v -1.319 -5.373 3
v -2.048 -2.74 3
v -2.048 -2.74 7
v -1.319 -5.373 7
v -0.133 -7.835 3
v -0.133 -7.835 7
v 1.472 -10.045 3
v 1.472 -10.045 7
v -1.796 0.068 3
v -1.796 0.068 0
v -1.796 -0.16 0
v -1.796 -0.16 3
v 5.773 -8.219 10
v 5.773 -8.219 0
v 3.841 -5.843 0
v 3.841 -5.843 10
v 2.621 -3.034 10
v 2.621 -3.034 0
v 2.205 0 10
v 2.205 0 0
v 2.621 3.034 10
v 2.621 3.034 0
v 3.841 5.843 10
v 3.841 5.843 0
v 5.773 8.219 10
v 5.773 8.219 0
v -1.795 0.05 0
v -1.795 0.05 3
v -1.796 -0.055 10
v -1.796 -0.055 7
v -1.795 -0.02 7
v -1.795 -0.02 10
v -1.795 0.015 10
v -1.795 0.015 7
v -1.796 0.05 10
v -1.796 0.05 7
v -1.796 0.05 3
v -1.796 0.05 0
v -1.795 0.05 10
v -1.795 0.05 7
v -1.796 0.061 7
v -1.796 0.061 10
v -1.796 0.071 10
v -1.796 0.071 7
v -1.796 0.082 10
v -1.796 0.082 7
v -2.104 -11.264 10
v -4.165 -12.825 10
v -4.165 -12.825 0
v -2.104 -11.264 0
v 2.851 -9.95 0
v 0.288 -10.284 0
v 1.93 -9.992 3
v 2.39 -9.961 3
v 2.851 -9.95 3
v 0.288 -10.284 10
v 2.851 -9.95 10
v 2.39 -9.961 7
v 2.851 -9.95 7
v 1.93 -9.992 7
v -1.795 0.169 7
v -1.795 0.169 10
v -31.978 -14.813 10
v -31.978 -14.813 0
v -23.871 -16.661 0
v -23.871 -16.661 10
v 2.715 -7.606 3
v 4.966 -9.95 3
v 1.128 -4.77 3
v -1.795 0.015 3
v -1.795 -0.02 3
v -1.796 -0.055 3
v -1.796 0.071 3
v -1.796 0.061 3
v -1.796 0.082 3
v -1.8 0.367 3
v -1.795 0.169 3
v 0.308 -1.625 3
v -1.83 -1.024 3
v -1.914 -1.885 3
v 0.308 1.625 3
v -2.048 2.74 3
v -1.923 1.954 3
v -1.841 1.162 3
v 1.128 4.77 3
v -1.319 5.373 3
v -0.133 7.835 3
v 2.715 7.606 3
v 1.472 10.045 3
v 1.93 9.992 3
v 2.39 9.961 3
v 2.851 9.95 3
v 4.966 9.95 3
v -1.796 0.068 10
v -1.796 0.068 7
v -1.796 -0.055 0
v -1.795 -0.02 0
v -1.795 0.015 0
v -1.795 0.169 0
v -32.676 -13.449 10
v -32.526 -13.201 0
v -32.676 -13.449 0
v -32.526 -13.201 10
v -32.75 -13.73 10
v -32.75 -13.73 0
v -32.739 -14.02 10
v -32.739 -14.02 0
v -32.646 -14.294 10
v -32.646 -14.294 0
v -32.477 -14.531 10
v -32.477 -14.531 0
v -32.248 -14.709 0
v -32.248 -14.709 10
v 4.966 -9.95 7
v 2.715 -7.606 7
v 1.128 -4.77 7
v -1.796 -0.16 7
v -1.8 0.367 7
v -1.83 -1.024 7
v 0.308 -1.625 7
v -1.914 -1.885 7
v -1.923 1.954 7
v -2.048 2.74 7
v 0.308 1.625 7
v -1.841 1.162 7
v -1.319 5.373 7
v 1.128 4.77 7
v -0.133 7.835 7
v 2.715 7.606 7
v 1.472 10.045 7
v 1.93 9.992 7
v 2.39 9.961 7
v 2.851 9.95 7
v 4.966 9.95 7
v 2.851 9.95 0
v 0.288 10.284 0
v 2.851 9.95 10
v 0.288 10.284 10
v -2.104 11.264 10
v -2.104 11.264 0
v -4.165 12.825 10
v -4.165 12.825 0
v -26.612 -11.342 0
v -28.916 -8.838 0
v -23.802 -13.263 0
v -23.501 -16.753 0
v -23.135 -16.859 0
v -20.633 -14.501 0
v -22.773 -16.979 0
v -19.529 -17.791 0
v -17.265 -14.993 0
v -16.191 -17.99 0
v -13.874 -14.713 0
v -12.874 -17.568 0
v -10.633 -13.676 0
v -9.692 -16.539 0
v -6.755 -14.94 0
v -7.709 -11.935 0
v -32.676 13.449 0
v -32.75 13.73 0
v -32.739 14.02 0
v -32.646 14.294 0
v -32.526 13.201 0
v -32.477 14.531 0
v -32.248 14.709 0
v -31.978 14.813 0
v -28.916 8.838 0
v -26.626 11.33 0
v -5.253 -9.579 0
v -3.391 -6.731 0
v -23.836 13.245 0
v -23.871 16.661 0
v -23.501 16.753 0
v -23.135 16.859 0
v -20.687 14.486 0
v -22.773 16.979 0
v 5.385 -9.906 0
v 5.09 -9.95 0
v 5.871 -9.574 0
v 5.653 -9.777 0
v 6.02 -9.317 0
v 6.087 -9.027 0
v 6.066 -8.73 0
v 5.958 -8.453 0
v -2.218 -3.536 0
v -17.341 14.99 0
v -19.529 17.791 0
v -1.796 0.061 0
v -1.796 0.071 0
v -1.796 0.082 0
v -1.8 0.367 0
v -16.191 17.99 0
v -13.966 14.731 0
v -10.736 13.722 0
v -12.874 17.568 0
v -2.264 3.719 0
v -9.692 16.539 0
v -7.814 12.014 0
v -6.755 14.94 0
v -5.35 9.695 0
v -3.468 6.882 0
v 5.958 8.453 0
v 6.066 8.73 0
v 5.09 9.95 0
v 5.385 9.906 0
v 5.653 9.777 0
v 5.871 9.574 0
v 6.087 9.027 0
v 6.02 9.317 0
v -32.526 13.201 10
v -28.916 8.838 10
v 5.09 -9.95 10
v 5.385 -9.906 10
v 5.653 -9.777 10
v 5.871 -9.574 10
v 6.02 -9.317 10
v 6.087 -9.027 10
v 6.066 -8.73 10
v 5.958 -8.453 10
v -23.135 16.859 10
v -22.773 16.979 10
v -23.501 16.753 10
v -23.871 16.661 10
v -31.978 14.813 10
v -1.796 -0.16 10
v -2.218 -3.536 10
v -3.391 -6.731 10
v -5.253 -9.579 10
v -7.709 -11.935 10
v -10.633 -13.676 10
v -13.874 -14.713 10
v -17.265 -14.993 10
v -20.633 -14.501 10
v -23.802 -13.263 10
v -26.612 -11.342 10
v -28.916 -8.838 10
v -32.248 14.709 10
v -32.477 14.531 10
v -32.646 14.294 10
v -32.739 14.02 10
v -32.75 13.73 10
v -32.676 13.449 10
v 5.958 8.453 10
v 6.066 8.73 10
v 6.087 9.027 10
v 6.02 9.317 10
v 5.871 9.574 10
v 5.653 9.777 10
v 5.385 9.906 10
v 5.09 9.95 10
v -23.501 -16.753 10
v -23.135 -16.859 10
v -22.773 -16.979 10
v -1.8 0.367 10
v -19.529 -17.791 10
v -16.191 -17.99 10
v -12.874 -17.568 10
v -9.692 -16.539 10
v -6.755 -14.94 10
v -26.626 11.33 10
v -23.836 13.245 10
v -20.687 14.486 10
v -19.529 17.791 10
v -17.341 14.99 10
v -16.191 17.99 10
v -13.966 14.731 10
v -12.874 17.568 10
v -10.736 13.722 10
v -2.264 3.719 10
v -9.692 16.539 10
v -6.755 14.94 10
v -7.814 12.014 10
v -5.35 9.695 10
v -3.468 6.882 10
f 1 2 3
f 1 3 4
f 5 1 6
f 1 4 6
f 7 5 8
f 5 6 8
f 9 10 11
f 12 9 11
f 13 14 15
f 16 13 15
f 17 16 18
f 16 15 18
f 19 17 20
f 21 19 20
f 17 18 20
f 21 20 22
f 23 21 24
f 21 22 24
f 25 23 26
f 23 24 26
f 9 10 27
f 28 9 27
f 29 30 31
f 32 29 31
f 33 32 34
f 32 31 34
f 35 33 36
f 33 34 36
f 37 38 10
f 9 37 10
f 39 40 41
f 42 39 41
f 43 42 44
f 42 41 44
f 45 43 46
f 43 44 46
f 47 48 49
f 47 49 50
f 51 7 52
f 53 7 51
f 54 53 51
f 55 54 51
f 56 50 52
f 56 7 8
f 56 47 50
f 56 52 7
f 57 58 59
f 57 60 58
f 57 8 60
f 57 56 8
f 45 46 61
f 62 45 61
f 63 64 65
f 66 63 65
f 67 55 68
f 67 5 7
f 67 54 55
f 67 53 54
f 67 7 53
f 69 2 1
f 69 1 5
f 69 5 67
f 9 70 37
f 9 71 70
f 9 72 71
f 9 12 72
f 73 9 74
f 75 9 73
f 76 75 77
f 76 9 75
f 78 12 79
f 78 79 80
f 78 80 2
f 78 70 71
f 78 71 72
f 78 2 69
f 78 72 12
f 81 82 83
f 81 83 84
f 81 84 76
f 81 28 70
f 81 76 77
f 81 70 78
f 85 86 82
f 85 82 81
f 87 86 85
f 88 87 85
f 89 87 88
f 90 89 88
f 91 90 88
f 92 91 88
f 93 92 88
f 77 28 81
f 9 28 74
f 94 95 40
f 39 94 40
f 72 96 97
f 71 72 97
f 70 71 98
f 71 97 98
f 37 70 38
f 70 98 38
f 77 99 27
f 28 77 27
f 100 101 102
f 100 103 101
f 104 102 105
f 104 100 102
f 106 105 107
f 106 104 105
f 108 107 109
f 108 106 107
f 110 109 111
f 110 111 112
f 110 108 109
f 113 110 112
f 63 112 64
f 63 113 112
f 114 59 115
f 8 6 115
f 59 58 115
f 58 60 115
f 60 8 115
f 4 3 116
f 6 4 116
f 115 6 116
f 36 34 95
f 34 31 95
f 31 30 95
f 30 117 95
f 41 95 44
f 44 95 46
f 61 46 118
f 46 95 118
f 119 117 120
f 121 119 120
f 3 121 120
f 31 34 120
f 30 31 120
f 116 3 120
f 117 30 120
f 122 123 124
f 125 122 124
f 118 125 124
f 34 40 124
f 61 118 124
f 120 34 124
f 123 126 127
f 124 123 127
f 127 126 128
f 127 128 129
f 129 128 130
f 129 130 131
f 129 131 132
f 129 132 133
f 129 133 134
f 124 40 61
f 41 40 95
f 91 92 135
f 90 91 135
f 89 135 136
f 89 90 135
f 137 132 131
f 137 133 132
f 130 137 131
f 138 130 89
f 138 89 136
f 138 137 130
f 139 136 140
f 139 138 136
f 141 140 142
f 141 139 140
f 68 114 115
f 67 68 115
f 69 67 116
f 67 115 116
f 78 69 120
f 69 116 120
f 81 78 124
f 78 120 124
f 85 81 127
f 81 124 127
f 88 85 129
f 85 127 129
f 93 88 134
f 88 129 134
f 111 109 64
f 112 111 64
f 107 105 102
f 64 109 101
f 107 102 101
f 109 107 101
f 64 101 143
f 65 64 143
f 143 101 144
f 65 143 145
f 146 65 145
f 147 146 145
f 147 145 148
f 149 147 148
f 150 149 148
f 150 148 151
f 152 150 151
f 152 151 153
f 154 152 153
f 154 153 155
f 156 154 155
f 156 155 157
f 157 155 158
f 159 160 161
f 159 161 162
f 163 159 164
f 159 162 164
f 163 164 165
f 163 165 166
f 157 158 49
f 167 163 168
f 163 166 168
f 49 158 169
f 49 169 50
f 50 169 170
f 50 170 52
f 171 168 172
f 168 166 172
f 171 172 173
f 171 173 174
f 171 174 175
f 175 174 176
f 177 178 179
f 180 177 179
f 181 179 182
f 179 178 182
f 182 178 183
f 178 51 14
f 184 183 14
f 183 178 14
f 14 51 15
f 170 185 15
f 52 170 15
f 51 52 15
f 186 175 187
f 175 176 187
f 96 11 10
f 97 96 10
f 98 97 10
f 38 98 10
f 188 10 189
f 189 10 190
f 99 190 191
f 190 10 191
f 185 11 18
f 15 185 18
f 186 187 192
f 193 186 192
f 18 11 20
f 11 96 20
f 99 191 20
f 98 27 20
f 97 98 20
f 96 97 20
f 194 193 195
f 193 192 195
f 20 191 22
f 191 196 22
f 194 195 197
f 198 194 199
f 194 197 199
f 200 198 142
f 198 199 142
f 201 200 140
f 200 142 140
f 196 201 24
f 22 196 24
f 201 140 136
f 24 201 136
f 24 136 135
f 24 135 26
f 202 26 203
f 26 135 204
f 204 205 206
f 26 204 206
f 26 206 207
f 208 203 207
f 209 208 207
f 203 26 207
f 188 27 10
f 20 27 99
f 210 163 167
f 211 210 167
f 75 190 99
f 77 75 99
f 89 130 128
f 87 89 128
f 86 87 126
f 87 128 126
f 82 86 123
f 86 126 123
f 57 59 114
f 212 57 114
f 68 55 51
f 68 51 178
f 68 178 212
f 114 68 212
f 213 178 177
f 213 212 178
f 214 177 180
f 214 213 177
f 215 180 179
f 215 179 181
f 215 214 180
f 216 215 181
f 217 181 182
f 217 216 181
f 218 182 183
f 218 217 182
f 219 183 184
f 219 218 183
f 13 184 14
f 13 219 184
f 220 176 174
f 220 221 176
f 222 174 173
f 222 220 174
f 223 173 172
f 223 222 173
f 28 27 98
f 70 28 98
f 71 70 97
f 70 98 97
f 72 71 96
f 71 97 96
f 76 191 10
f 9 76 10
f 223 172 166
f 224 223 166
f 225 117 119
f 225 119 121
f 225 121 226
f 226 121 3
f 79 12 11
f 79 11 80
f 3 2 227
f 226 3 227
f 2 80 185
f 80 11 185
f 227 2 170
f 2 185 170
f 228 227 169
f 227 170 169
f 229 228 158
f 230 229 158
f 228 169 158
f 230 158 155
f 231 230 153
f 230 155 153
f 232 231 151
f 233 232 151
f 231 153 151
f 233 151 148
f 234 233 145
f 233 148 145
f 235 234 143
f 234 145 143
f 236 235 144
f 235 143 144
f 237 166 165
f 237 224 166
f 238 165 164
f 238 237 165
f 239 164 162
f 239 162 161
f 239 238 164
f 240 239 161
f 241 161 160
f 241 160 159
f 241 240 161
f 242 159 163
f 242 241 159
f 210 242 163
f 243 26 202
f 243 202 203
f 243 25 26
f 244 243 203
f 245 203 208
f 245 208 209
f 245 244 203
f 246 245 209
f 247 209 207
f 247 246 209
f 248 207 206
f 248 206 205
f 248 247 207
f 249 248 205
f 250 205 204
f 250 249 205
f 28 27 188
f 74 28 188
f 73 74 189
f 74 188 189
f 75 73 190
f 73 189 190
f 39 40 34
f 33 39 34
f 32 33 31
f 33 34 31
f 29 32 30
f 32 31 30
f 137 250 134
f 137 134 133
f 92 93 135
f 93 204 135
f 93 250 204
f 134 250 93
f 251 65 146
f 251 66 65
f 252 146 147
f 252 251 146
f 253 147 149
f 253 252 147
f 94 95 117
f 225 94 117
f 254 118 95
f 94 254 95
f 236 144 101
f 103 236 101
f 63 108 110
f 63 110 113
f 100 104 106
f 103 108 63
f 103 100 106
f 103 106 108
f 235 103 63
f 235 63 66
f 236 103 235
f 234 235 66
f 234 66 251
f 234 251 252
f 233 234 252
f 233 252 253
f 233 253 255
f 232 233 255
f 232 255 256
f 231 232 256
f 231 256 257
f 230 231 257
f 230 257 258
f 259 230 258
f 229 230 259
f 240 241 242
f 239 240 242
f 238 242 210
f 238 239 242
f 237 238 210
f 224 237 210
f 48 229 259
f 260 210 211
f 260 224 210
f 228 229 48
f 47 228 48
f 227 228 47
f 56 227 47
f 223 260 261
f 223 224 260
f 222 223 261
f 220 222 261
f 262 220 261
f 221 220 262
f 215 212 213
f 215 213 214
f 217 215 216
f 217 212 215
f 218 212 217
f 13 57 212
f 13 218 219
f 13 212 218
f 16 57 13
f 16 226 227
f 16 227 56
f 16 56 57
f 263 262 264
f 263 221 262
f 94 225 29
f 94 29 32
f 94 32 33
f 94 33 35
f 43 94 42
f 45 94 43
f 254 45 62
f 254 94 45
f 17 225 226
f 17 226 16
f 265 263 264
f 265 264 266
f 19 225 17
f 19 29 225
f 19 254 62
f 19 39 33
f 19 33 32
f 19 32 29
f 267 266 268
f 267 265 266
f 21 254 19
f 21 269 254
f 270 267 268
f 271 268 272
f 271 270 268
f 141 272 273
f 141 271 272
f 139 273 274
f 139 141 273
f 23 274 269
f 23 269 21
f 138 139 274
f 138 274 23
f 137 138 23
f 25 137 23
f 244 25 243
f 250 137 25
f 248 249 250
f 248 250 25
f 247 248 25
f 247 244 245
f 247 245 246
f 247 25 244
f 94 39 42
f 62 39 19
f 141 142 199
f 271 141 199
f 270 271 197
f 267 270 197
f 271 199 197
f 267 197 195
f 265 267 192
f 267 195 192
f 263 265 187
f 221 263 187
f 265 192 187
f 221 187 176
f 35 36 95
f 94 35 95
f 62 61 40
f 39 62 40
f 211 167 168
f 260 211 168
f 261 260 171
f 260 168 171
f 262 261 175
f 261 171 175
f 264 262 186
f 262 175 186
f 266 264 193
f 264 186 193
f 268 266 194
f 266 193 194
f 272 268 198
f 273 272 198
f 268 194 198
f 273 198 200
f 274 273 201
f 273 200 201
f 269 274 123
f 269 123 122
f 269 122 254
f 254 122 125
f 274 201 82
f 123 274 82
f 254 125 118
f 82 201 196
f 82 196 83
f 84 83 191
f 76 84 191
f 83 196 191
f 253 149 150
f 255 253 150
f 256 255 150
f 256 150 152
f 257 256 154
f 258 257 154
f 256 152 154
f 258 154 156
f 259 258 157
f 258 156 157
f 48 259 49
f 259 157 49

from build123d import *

# Parameters (mm, degrees)
F1_DEPTH = 10
F2_R     = 1
F3_R     = 10
F6_DEPTH = 4
F7_R     = 1


# Not quite as in the source:
# - ends of sketch curves that miss each other by under 0.0002 mm in the source are joined
# - a feature names something its author has since deleted; it is built from what else it names


with BuildPart() as f1:
    # F0 (on Top) → F1 (new body)
    with BuildSketch(Plane.XY):
        with BuildLine():
            ThreePointArc((-1.7962988307, -0.1596333839), (-12.2238763072, -14.2863823148), (-28.9155127569, -8.8376503509))
            Line((-28.9155127569, -8.8376503509), (-33.5614731624, -14.4524267481))
            Line((-33.5614731624, -14.4524267481), (-23.2513401401, -16.8024246609))
            ThreePointArc((-23.2513401401, -16.8024246609), (-11.3191539124, -17.1467252838), (-1.7954493794, -9.9498743711))
            Line((-1.7954493794, -9.9498743711), (8.2045506206, -9.9498743711))
            ThreePointArc((8.2045506206, -9.9498743711), (2.2045506206, 0), (8.2045506206, 9.9498743711))
            Line((8.2045506206, 9.9498743711), (-1.7954493794, 9.9498743711))
            ThreePointArc((-1.7954493794, 9.9498743711), (-11.3191539124, 17.1467252838), (-23.2513401401, 16.8024246609))
            Line((-23.2513401401, 16.8024246609), (-33.5614731624, 14.4524267481))
            Line((-33.5614731624, 14.4524267481), (-28.9155127569, 8.8376503509))
            ThreePointArc((-28.9155127569, 8.8376503509), (-12.3227425268, 14.3176427323), (-1.79993923, 0.3669814152))
            ThreePointArc((-1.79993923, 0.3669814152), (-1.7971307794, 0.2245866702), (-1.7956744539, 0.0821716783))
            Line((-1.7956744539, 0.0821716783), (-1.7954493794, 0.1693372455))
            Line((-1.7954493794, 0.1693372455), (-1.7954493794, 0.0497335093))
            ThreePointArc((-1.7954493794, 0.0497335093), (-1.795550035, -0.0549514122), (-1.7962988307, -0.1596333839))
        make_face()
        with BuildLine():
            Line((-1.7957105611, 0.0681883168), (-1.7962988307, -0.1596333839))
            ThreePointArc((-1.7962988307, -0.1596333839), (-1.795550035, -0.0549514122), (-1.7955318261, 0.049733236))
            Line((-1.7955318261, 0.049733236), (-1.7957105611, 0.0681883168))
        make_face()
        with BuildLine():
            Line((-1.7957105611, 0.0681883168), (-1.7954493794, 0.0497335093))
            ThreePointArc((-1.7954493794, 0.0497335093), (-1.7955943712, 0.0659524957), (-1.7956744539, 0.0821716783))
            Line((-1.7956744539, 0.0821716783), (-1.7957105611, 0.0681883168))
        make_face()
        with BuildLine():
            Line((-1.79993923, 0.3669814152), (-1.7957105611, 0.0681883168))
            Line((-1.7957105611, 0.0681883168), (-1.7956744539, 0.0821716783))
            ThreePointArc((-1.7956744539, 0.0821716783), (-1.7971307794, 0.2245866702), (-1.79993923, 0.3669814152))
        make_face()
    extrude(amount=F1_DEPTH)

    # F2
    f2_edges = [f1.edges().sort_by_distance(p)[0] for p in [
        (-33.561473, -14.452427, 5),
        (-33.561473, 14.452427, 5),
    ]]
    fillet(f2_edges, radius=F2_R)

    # F3
    f3_edges = [f1.edges().sort_by_distance(p)[0] for p in [
        (-1.795449, 9.949874, 5),
        (-1.795449, -9.949874, 5),
        (-23.25134, 16.802425, 5),
        (-23.25134, -16.802425, 5),
    ]]
    fillet(f3_edges, radius=F3_R)

    # F5 (on offset) → F6 (cut)
    with BuildSketch(Plane.XY.offset(7)):
        with BuildLine():
            ThreePointArc((11.5250723848, -12.6931975947), (0.3398769597, -1.8546317787), (7.9403583125, 11.740065307))
            Line((7.9403583125, 11.740065307), (3.2065206071, 11.740065307))
            ThreePointArc((3.2065206071, 11.740065307), (-2.2747136402, -0.7956794231), (4.4808682127, -12.6931975947))
            Line((4.4808682127, -12.6931975947), (11.5250723848, -12.6931975947))
        make_face()
    extrude(amount=-F6_DEPTH, mode=Mode.SUBTRACT)

    # F7
    f7_edges = [f1.edges().sort_by_distance(p)[0] for p in [
        (8.204551, 9.949874, 5),
        (8.204551, -9.949874, 5),
    ]]
    fillet(f7_edges, radius=F7_R)


solid = f1.part
